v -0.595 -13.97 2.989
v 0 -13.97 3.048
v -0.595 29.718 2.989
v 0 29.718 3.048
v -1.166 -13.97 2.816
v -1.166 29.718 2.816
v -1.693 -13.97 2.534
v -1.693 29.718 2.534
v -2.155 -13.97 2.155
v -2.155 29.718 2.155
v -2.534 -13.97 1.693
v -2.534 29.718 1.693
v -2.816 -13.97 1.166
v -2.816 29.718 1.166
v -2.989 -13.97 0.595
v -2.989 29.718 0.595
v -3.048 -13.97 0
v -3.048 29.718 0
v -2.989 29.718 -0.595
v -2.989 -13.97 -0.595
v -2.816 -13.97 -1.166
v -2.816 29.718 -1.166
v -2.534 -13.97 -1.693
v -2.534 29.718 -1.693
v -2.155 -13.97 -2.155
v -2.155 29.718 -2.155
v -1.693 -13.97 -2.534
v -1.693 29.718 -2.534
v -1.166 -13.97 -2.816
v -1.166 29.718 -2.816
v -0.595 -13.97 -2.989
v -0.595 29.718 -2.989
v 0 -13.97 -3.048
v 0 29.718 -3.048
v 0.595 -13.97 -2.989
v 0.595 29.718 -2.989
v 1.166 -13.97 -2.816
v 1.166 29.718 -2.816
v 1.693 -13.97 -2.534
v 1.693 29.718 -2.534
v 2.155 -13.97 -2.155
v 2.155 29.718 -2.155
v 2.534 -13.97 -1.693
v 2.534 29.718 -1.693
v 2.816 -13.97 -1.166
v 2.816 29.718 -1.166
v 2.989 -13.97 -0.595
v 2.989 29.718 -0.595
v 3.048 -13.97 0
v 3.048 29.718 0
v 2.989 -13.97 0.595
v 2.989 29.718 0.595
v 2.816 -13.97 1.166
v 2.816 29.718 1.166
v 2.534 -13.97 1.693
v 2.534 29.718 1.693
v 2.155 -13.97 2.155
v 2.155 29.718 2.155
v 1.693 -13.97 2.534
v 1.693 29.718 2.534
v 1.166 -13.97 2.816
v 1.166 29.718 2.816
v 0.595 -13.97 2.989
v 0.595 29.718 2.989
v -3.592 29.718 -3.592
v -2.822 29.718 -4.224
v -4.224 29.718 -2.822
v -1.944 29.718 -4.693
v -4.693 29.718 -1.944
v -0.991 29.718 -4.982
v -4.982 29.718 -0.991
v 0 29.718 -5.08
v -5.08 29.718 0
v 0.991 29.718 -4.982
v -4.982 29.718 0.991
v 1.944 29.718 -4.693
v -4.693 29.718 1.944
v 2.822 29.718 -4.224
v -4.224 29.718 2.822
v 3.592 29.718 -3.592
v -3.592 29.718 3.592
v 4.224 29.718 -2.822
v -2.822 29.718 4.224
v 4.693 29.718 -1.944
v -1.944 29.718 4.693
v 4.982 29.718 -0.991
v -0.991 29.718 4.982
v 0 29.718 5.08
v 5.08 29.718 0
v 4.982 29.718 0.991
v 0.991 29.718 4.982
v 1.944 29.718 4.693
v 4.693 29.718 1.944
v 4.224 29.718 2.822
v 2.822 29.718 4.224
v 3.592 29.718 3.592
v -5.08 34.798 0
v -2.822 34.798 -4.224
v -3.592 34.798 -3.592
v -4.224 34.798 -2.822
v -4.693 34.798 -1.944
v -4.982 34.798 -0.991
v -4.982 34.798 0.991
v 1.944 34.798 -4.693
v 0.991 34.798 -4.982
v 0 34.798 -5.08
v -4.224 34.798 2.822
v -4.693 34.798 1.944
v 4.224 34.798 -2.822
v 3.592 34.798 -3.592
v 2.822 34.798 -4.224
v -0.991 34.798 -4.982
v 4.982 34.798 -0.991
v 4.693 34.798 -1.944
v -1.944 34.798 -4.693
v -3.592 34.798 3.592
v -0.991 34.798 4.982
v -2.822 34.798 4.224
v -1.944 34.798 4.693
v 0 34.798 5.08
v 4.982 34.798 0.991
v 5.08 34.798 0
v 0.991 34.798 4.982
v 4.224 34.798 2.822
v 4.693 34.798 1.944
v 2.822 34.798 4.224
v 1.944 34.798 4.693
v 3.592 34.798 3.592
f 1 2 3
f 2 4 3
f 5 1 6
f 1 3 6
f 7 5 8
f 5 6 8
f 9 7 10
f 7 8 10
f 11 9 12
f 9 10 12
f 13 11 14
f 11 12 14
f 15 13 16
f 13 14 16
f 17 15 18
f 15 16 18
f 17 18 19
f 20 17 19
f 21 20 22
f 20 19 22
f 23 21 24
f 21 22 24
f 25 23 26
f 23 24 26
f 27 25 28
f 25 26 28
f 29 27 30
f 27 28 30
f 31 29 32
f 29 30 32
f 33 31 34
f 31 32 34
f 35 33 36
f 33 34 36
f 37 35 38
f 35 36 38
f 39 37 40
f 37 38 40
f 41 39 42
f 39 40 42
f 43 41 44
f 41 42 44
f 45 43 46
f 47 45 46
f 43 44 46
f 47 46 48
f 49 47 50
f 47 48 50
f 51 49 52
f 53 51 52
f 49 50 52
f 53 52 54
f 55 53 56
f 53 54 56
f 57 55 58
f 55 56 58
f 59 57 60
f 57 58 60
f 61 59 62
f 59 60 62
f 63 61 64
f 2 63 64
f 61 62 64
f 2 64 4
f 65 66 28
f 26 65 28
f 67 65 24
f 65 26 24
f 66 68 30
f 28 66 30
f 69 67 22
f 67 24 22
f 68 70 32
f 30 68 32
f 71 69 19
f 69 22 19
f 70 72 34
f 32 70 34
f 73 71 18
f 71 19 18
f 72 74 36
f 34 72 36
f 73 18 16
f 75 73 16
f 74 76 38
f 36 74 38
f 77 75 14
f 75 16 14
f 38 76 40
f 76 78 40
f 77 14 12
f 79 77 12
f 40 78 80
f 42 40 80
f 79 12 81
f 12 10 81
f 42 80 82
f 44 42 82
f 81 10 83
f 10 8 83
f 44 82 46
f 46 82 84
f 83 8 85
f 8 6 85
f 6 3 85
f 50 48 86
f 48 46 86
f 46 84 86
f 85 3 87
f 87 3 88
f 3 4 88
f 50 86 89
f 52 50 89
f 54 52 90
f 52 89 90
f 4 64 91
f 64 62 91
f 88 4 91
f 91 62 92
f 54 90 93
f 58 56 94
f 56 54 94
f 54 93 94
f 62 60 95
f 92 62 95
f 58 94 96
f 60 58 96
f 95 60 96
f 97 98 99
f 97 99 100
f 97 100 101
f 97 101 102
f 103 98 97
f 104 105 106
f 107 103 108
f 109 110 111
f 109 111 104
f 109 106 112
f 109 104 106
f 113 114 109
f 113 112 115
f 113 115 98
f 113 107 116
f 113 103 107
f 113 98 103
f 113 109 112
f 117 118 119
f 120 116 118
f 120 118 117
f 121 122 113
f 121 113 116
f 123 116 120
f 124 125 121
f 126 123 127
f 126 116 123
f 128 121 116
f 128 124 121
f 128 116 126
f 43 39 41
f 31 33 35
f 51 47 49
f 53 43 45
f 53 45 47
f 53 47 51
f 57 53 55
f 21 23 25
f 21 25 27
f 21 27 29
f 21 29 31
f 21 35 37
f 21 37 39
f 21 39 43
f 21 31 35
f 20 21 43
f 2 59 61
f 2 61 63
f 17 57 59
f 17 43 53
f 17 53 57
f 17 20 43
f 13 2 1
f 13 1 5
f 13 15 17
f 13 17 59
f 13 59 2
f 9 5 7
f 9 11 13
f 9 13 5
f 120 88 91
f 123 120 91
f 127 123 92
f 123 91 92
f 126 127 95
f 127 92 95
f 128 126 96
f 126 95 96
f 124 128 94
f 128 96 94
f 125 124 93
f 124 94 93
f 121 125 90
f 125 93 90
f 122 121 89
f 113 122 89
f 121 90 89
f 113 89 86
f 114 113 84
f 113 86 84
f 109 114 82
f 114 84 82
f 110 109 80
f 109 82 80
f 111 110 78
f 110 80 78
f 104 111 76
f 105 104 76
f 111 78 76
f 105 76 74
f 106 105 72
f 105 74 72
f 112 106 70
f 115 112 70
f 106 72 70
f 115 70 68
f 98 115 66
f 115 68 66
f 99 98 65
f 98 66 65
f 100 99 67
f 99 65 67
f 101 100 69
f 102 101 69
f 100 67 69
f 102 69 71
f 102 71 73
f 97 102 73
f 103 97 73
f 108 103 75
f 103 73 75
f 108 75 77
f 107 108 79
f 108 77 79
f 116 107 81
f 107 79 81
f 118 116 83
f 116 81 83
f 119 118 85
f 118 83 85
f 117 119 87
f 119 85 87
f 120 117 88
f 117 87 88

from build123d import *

# Parameters (mm, degrees)
BOSS_EXTRUDE1_DEPTH      = 29.718
BOSS_EXTRUDE1_DEPTH_BACK = 8.89
SKETCH2_R                = 3.048
SKETCH3_R                = 5.08
BOSS_EXTRUDE2_DEPTH      = 5.08
SKETCH4_R                = 3.048
BOSS_EXTRUDE3_DEPTH      = 5.08


with BuildPart() as part:
    # Sketch2 → Boss-Extrude1 (new, two sides: drawn at the far end of the back side and taken through both)
    with BuildSketch(Plane(origin=(0, 0, 0), x_dir=(1, 0, 0), z_dir=(0, 1, 0)).offset(-BOSS_EXTRUDE1_DEPTH_BACK)):
        with Locations(Location((0, 0, 0), (0, 0, 270))):
            Circle(SKETCH2_R)
    extrude(amount=BOSS_EXTRUDE1_DEPTH + BOSS_EXTRUDE1_DEPTH_BACK)

    # Sketch3 → Boss-Extrude2 (add)
    with BuildSketch(Plane(origin=(0, 29.718, 0), x_dir=(1, 0, 0), z_dir=(0, 1, 0))):
        with Locations(Location((0, 0, 0), (0, 0, 270))):
            Circle(SKETCH3_R)
    extrude(amount=BOSS_EXTRUDE2_DEPTH)

    # Sketch4 → Boss-Extrude3 (add)
    with BuildSketch(Plane.XZ.offset(8.89)):
        with Locations(Location((0, 0, 0), (0, 0, 90))):
            Circle(SKETCH4_R)
    extrude(amount=BOSS_EXTRUDE3_DEPTH)


solid = part.part
